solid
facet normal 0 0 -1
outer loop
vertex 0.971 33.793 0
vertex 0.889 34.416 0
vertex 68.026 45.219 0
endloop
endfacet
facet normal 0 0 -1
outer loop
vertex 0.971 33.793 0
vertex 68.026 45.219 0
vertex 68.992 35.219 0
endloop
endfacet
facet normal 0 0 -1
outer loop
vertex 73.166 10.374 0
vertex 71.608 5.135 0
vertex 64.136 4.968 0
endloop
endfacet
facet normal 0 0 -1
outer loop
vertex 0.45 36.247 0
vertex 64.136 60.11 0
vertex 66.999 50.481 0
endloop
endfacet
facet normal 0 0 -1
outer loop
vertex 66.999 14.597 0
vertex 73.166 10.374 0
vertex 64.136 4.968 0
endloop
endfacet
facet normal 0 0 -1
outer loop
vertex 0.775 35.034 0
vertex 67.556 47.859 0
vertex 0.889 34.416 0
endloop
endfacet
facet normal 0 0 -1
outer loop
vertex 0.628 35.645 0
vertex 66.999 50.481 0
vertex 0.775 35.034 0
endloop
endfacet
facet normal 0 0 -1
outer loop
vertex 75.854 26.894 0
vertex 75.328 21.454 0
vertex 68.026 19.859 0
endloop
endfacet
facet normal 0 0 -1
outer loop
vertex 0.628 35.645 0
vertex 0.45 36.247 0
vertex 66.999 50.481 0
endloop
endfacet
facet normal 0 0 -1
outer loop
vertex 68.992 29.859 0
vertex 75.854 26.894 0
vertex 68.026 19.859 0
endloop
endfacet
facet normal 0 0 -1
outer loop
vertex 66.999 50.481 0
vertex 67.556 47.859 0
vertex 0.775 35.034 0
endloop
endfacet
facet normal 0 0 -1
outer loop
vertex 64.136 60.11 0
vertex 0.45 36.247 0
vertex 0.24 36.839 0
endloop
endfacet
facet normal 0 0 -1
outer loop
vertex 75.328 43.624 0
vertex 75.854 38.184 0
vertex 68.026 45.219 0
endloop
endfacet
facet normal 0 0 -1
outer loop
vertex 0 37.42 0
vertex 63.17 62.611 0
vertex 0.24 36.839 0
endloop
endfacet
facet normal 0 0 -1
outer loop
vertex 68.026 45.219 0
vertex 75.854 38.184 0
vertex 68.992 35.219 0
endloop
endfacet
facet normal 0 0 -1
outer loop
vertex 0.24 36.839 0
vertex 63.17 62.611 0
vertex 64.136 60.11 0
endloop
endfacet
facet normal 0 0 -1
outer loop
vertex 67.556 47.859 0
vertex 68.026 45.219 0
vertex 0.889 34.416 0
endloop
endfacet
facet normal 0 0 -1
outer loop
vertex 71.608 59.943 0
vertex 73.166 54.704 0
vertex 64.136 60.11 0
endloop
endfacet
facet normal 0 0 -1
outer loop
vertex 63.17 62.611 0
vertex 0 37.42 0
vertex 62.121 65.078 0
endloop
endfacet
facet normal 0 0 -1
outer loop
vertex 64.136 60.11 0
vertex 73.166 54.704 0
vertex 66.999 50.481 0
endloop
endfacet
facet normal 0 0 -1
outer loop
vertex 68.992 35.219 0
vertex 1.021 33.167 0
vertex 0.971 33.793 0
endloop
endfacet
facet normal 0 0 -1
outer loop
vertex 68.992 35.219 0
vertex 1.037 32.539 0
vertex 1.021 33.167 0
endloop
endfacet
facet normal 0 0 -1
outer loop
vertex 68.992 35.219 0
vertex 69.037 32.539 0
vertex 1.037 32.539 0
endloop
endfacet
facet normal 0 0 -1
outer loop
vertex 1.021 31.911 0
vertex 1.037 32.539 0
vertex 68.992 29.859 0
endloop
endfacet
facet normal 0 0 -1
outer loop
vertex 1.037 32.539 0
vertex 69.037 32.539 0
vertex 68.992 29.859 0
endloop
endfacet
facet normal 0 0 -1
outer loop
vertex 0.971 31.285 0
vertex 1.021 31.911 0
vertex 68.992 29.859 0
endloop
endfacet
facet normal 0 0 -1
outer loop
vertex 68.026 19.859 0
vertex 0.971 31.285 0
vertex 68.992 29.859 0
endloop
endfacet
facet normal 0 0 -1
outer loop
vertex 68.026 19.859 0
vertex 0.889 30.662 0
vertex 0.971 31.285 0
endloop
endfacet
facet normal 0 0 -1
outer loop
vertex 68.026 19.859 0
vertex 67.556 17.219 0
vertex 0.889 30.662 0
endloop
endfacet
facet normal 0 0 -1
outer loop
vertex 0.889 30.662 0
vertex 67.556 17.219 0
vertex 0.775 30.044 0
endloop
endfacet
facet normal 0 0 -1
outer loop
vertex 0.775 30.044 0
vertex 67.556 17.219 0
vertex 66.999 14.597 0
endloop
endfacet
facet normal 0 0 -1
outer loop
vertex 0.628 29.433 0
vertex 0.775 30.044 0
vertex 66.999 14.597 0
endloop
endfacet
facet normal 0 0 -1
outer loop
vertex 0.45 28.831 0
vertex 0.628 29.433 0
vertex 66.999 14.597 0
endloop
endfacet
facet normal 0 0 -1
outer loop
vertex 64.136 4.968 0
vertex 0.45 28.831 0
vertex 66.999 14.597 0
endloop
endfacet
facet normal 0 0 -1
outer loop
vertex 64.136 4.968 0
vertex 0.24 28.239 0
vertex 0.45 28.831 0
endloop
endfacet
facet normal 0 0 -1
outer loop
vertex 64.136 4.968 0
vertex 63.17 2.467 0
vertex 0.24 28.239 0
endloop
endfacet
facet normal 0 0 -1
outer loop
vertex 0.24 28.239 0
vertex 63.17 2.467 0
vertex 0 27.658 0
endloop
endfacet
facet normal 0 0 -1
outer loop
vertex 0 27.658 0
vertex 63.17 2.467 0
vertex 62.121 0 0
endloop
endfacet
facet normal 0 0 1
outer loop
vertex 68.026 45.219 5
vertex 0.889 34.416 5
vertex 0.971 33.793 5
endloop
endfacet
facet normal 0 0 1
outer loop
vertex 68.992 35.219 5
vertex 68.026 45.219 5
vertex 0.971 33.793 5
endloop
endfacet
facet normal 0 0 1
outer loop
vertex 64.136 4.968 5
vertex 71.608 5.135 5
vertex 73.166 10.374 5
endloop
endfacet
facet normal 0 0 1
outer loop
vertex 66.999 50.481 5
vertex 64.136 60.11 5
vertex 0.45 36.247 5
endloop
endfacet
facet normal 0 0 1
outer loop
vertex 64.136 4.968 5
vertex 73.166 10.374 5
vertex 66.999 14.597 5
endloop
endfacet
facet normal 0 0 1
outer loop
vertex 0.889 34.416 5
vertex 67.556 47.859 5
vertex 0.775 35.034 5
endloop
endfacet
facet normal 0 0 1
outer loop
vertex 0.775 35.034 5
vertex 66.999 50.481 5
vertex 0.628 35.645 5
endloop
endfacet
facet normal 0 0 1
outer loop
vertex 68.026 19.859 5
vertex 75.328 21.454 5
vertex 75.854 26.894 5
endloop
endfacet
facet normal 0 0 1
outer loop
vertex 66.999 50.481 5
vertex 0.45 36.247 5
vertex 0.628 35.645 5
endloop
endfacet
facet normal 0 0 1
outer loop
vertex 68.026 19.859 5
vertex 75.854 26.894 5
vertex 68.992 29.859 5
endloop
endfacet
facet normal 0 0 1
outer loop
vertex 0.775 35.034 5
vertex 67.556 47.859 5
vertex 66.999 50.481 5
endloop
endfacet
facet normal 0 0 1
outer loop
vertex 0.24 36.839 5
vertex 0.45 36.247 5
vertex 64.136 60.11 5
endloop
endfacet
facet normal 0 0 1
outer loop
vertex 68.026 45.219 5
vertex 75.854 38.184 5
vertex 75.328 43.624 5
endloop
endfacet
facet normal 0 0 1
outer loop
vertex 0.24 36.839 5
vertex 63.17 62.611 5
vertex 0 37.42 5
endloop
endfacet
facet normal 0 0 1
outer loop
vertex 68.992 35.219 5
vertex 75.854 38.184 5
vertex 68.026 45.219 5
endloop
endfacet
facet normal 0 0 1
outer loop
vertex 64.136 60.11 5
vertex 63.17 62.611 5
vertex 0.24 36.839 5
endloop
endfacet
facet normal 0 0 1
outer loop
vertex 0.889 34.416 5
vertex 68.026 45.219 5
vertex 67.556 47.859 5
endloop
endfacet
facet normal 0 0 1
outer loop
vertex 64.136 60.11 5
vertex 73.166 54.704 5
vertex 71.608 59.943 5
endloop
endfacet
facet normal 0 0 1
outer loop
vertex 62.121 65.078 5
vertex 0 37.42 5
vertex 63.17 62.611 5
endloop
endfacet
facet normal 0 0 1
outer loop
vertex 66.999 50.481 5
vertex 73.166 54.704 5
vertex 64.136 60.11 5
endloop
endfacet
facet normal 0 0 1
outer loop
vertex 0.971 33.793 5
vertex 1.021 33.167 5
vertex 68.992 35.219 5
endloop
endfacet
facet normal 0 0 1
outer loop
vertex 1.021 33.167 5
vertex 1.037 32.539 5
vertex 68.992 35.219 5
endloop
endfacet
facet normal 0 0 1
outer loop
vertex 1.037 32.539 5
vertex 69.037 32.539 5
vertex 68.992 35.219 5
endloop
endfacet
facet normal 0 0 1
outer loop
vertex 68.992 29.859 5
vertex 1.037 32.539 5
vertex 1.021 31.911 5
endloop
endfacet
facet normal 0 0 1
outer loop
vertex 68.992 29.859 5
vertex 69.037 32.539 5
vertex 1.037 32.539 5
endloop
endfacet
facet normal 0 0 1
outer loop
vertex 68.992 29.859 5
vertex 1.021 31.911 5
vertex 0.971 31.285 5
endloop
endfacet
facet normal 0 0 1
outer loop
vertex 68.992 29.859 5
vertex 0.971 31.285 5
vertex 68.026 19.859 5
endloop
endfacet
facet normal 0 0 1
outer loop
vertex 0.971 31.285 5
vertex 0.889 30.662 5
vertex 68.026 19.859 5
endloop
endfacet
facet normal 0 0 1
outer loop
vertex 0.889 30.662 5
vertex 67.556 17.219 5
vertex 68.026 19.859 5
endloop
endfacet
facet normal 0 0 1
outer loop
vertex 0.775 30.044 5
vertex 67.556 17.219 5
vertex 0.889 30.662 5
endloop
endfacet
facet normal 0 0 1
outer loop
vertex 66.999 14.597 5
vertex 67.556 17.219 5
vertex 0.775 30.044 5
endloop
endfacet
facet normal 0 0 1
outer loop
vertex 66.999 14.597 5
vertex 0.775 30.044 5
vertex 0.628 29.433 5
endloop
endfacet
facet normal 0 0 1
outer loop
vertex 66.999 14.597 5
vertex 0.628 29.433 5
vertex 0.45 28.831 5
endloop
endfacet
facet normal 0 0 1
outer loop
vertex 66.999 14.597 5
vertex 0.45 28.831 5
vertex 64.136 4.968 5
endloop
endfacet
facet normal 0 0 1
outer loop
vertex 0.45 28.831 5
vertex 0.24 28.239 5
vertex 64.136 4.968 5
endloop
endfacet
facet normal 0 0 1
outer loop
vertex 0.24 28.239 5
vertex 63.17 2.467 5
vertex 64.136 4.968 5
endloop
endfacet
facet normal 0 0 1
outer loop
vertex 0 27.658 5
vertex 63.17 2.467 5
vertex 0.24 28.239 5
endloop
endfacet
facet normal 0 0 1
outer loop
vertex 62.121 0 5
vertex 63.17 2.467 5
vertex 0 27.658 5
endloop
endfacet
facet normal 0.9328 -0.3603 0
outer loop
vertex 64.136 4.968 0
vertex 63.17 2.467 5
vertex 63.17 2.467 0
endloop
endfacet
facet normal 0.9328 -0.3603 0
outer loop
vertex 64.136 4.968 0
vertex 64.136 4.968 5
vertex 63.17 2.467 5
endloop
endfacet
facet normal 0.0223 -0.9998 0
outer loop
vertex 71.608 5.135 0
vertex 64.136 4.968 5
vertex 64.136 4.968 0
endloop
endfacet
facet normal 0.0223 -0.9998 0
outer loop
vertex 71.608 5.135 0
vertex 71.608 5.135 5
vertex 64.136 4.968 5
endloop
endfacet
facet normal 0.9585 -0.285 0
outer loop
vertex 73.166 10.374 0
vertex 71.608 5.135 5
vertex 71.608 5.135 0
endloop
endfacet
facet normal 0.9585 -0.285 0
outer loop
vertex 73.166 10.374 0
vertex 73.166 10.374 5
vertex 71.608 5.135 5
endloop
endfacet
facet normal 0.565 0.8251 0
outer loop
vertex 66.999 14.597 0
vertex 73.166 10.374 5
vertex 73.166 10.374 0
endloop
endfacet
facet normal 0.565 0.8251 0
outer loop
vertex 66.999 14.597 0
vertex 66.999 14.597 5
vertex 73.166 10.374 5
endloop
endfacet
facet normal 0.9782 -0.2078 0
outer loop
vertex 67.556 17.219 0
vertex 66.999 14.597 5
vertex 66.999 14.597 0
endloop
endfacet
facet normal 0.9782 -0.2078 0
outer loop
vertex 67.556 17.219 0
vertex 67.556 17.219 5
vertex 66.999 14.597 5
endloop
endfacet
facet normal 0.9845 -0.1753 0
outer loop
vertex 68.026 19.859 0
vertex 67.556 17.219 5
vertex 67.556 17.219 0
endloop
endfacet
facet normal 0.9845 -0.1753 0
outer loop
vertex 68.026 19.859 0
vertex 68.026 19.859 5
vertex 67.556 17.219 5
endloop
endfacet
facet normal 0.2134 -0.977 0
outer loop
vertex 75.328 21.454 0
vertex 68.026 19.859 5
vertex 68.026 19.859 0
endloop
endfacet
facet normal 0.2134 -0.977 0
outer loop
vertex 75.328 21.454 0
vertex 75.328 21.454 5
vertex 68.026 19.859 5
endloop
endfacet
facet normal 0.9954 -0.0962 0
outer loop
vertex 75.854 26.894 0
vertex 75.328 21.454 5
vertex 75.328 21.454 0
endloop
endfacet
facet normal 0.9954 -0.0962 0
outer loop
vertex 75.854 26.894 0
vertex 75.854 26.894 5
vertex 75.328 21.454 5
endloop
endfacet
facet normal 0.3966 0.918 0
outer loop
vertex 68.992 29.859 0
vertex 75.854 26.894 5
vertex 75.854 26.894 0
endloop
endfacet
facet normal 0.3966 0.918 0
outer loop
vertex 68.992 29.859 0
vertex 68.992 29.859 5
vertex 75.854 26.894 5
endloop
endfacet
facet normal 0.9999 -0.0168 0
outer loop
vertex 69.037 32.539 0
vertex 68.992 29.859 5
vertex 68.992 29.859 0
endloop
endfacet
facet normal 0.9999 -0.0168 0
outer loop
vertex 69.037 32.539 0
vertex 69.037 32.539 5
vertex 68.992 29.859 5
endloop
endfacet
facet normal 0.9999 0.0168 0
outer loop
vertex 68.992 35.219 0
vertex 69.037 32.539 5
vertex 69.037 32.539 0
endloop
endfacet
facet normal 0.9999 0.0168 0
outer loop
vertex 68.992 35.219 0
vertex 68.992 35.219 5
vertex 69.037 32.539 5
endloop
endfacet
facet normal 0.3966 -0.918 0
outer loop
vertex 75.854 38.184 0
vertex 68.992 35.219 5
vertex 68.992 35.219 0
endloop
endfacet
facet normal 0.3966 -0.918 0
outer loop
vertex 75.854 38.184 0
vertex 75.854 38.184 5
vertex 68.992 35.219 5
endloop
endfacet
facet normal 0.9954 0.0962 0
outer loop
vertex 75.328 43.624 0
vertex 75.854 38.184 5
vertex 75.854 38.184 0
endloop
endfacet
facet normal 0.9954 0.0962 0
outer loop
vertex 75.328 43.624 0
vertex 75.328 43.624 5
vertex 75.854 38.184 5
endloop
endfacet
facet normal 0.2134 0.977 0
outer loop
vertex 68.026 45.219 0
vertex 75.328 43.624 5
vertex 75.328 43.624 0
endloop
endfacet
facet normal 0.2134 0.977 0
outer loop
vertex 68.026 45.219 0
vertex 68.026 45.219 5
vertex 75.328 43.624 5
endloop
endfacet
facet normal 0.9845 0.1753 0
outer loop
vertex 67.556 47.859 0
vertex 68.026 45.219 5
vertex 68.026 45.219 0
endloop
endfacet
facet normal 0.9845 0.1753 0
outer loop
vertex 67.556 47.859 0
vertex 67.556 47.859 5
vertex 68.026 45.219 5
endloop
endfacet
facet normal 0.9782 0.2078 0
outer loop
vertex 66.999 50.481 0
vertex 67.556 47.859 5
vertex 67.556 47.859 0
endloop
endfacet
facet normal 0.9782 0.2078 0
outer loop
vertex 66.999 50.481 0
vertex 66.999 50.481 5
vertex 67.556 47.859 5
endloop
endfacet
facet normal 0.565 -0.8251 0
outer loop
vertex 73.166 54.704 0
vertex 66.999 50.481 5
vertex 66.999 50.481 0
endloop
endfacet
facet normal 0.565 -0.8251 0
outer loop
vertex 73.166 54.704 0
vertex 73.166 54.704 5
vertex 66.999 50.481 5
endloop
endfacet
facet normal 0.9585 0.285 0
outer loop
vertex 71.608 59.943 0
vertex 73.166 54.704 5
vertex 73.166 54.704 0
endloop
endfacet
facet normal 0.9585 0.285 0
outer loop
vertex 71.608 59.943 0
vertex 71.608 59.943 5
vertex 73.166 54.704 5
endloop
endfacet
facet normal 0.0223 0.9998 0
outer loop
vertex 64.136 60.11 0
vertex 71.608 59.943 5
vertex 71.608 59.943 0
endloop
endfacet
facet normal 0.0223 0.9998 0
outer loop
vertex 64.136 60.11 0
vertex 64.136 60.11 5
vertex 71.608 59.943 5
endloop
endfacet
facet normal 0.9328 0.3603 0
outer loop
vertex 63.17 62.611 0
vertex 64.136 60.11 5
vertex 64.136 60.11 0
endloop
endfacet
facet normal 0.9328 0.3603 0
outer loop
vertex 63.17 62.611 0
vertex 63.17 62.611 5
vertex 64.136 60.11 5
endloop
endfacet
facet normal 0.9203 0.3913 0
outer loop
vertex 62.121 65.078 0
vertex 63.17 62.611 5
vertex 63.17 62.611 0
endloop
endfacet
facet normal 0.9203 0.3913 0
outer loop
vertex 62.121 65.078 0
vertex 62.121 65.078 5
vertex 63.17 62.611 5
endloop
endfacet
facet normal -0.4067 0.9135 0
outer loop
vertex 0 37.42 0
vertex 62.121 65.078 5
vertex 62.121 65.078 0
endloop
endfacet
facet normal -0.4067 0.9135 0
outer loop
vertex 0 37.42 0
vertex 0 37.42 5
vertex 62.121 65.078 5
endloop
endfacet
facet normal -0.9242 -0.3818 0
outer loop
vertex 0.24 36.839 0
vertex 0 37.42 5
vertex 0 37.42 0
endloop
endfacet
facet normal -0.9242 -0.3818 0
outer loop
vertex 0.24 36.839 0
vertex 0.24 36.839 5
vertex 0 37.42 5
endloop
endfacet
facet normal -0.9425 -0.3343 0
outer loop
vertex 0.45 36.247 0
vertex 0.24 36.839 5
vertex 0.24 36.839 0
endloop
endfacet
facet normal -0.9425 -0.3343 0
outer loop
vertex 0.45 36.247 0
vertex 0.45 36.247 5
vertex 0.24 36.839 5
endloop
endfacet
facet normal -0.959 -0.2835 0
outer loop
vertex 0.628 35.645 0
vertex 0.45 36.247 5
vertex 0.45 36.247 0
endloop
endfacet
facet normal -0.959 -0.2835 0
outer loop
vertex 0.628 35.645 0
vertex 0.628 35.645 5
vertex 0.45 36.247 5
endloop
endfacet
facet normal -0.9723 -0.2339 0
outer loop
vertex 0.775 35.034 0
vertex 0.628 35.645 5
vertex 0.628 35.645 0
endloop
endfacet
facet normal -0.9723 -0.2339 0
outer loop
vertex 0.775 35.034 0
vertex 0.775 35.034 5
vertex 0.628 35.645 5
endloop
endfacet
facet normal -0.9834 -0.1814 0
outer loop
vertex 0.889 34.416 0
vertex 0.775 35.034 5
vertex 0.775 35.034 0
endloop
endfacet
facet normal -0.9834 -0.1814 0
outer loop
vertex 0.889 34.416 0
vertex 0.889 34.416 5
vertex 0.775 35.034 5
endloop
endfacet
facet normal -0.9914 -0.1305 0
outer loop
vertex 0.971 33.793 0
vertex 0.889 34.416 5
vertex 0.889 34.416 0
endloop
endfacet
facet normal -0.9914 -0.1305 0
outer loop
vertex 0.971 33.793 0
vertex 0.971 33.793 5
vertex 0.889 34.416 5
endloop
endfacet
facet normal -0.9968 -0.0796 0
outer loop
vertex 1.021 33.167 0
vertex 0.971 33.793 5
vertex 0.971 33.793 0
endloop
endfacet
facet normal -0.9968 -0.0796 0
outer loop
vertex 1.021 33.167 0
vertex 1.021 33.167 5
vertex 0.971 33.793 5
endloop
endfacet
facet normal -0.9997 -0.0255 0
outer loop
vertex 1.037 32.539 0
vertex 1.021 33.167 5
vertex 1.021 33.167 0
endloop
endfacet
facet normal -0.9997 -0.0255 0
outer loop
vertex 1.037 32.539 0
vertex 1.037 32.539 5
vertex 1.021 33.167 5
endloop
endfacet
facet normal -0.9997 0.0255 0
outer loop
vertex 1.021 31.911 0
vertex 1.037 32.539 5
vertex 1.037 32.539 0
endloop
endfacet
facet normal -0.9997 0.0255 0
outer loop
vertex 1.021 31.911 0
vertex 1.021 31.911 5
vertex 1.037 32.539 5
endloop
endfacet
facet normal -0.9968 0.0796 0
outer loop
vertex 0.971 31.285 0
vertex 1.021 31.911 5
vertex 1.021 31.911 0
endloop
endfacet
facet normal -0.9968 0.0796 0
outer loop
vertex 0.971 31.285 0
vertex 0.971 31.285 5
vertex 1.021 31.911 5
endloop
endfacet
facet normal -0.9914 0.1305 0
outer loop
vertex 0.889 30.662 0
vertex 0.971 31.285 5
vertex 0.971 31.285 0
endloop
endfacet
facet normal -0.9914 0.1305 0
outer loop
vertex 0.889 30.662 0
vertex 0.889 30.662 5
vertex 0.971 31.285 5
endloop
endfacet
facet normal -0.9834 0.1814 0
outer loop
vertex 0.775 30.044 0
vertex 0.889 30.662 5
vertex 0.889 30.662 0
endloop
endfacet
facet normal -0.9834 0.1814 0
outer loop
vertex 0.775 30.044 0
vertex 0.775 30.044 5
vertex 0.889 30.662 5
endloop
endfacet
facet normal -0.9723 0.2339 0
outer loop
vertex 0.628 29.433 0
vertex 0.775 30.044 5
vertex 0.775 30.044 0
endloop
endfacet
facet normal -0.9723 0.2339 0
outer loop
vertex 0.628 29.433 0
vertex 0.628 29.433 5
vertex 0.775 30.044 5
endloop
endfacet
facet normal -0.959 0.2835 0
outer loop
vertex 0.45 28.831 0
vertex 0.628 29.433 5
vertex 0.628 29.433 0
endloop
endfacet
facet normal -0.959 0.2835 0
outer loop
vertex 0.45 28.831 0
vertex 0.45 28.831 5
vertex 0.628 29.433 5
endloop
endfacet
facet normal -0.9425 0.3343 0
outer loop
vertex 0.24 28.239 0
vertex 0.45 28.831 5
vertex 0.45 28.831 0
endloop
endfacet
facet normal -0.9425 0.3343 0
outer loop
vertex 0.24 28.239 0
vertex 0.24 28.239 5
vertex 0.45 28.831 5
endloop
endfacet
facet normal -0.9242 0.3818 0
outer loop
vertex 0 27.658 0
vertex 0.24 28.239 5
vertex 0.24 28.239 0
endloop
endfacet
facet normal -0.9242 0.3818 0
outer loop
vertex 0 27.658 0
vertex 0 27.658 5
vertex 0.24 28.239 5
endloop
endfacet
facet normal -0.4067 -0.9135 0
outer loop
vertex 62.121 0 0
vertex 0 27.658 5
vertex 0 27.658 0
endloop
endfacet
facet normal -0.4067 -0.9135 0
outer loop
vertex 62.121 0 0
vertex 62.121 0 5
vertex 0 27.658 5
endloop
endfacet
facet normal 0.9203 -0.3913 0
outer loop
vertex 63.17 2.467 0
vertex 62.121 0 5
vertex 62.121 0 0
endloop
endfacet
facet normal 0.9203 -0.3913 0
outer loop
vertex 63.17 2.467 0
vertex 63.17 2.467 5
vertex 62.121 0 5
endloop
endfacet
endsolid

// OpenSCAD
$fn = 32;

// ----------------------------------------------------------------------
// Gear sector: 4 teeth on 48 degrees
// ----------------------------------------------------------------------

// --- parameters (mm) ---
sector_angle = 48;        // sector angle, degrees
root_r = 80;              // root circle radius
tooth_h = 7;              // tooth height over the root circle
teeth = 4;                // number of teeth on the sector
hub_r = 12;               // hub bore radius
plate_t = 5;              // sector thickness, Z
arc_step = 3;             // sampling step of the root/hub arcs, degrees

tip_r = root_r + tooth_h;  // tip circle radius

profile = [[62.121, 0], [63.17, 2.467], [64.136, 4.968], [71.608, 5.135], [73.166, 10.374], [66.999, 14.597], [67.556, 17.219], [68.026, 19.859], [75.328, 21.454], [75.854, 26.894], [68.992, 29.859], [69.037, 32.539], [68.992, 35.219], [75.854, 38.184], [75.328, 43.624], [68.026, 45.219], [67.556, 47.859], [66.999, 50.481], [73.166, 54.704], [71.608, 59.943], [64.136, 60.11], [63.17, 62.611], [62.121, 65.078], [0, 37.42], [0.24, 36.839], [0.45, 36.247], [0.628, 35.645], [0.775, 35.034], [0.889, 34.416], [0.971, 33.793], [1.021, 33.167], [1.037, 32.539], [1.021, 31.911], [0.971, 31.285], [0.889, 30.662], [0.775, 30.044], [0.628, 29.433], [0.45, 28.831], [0.24, 28.239], [0, 27.658]];  // primary outline, 40 points, counter clockwise

// --- the one profile operation ---
linear_extrude(height = plate_t) polygon(points = profile);
